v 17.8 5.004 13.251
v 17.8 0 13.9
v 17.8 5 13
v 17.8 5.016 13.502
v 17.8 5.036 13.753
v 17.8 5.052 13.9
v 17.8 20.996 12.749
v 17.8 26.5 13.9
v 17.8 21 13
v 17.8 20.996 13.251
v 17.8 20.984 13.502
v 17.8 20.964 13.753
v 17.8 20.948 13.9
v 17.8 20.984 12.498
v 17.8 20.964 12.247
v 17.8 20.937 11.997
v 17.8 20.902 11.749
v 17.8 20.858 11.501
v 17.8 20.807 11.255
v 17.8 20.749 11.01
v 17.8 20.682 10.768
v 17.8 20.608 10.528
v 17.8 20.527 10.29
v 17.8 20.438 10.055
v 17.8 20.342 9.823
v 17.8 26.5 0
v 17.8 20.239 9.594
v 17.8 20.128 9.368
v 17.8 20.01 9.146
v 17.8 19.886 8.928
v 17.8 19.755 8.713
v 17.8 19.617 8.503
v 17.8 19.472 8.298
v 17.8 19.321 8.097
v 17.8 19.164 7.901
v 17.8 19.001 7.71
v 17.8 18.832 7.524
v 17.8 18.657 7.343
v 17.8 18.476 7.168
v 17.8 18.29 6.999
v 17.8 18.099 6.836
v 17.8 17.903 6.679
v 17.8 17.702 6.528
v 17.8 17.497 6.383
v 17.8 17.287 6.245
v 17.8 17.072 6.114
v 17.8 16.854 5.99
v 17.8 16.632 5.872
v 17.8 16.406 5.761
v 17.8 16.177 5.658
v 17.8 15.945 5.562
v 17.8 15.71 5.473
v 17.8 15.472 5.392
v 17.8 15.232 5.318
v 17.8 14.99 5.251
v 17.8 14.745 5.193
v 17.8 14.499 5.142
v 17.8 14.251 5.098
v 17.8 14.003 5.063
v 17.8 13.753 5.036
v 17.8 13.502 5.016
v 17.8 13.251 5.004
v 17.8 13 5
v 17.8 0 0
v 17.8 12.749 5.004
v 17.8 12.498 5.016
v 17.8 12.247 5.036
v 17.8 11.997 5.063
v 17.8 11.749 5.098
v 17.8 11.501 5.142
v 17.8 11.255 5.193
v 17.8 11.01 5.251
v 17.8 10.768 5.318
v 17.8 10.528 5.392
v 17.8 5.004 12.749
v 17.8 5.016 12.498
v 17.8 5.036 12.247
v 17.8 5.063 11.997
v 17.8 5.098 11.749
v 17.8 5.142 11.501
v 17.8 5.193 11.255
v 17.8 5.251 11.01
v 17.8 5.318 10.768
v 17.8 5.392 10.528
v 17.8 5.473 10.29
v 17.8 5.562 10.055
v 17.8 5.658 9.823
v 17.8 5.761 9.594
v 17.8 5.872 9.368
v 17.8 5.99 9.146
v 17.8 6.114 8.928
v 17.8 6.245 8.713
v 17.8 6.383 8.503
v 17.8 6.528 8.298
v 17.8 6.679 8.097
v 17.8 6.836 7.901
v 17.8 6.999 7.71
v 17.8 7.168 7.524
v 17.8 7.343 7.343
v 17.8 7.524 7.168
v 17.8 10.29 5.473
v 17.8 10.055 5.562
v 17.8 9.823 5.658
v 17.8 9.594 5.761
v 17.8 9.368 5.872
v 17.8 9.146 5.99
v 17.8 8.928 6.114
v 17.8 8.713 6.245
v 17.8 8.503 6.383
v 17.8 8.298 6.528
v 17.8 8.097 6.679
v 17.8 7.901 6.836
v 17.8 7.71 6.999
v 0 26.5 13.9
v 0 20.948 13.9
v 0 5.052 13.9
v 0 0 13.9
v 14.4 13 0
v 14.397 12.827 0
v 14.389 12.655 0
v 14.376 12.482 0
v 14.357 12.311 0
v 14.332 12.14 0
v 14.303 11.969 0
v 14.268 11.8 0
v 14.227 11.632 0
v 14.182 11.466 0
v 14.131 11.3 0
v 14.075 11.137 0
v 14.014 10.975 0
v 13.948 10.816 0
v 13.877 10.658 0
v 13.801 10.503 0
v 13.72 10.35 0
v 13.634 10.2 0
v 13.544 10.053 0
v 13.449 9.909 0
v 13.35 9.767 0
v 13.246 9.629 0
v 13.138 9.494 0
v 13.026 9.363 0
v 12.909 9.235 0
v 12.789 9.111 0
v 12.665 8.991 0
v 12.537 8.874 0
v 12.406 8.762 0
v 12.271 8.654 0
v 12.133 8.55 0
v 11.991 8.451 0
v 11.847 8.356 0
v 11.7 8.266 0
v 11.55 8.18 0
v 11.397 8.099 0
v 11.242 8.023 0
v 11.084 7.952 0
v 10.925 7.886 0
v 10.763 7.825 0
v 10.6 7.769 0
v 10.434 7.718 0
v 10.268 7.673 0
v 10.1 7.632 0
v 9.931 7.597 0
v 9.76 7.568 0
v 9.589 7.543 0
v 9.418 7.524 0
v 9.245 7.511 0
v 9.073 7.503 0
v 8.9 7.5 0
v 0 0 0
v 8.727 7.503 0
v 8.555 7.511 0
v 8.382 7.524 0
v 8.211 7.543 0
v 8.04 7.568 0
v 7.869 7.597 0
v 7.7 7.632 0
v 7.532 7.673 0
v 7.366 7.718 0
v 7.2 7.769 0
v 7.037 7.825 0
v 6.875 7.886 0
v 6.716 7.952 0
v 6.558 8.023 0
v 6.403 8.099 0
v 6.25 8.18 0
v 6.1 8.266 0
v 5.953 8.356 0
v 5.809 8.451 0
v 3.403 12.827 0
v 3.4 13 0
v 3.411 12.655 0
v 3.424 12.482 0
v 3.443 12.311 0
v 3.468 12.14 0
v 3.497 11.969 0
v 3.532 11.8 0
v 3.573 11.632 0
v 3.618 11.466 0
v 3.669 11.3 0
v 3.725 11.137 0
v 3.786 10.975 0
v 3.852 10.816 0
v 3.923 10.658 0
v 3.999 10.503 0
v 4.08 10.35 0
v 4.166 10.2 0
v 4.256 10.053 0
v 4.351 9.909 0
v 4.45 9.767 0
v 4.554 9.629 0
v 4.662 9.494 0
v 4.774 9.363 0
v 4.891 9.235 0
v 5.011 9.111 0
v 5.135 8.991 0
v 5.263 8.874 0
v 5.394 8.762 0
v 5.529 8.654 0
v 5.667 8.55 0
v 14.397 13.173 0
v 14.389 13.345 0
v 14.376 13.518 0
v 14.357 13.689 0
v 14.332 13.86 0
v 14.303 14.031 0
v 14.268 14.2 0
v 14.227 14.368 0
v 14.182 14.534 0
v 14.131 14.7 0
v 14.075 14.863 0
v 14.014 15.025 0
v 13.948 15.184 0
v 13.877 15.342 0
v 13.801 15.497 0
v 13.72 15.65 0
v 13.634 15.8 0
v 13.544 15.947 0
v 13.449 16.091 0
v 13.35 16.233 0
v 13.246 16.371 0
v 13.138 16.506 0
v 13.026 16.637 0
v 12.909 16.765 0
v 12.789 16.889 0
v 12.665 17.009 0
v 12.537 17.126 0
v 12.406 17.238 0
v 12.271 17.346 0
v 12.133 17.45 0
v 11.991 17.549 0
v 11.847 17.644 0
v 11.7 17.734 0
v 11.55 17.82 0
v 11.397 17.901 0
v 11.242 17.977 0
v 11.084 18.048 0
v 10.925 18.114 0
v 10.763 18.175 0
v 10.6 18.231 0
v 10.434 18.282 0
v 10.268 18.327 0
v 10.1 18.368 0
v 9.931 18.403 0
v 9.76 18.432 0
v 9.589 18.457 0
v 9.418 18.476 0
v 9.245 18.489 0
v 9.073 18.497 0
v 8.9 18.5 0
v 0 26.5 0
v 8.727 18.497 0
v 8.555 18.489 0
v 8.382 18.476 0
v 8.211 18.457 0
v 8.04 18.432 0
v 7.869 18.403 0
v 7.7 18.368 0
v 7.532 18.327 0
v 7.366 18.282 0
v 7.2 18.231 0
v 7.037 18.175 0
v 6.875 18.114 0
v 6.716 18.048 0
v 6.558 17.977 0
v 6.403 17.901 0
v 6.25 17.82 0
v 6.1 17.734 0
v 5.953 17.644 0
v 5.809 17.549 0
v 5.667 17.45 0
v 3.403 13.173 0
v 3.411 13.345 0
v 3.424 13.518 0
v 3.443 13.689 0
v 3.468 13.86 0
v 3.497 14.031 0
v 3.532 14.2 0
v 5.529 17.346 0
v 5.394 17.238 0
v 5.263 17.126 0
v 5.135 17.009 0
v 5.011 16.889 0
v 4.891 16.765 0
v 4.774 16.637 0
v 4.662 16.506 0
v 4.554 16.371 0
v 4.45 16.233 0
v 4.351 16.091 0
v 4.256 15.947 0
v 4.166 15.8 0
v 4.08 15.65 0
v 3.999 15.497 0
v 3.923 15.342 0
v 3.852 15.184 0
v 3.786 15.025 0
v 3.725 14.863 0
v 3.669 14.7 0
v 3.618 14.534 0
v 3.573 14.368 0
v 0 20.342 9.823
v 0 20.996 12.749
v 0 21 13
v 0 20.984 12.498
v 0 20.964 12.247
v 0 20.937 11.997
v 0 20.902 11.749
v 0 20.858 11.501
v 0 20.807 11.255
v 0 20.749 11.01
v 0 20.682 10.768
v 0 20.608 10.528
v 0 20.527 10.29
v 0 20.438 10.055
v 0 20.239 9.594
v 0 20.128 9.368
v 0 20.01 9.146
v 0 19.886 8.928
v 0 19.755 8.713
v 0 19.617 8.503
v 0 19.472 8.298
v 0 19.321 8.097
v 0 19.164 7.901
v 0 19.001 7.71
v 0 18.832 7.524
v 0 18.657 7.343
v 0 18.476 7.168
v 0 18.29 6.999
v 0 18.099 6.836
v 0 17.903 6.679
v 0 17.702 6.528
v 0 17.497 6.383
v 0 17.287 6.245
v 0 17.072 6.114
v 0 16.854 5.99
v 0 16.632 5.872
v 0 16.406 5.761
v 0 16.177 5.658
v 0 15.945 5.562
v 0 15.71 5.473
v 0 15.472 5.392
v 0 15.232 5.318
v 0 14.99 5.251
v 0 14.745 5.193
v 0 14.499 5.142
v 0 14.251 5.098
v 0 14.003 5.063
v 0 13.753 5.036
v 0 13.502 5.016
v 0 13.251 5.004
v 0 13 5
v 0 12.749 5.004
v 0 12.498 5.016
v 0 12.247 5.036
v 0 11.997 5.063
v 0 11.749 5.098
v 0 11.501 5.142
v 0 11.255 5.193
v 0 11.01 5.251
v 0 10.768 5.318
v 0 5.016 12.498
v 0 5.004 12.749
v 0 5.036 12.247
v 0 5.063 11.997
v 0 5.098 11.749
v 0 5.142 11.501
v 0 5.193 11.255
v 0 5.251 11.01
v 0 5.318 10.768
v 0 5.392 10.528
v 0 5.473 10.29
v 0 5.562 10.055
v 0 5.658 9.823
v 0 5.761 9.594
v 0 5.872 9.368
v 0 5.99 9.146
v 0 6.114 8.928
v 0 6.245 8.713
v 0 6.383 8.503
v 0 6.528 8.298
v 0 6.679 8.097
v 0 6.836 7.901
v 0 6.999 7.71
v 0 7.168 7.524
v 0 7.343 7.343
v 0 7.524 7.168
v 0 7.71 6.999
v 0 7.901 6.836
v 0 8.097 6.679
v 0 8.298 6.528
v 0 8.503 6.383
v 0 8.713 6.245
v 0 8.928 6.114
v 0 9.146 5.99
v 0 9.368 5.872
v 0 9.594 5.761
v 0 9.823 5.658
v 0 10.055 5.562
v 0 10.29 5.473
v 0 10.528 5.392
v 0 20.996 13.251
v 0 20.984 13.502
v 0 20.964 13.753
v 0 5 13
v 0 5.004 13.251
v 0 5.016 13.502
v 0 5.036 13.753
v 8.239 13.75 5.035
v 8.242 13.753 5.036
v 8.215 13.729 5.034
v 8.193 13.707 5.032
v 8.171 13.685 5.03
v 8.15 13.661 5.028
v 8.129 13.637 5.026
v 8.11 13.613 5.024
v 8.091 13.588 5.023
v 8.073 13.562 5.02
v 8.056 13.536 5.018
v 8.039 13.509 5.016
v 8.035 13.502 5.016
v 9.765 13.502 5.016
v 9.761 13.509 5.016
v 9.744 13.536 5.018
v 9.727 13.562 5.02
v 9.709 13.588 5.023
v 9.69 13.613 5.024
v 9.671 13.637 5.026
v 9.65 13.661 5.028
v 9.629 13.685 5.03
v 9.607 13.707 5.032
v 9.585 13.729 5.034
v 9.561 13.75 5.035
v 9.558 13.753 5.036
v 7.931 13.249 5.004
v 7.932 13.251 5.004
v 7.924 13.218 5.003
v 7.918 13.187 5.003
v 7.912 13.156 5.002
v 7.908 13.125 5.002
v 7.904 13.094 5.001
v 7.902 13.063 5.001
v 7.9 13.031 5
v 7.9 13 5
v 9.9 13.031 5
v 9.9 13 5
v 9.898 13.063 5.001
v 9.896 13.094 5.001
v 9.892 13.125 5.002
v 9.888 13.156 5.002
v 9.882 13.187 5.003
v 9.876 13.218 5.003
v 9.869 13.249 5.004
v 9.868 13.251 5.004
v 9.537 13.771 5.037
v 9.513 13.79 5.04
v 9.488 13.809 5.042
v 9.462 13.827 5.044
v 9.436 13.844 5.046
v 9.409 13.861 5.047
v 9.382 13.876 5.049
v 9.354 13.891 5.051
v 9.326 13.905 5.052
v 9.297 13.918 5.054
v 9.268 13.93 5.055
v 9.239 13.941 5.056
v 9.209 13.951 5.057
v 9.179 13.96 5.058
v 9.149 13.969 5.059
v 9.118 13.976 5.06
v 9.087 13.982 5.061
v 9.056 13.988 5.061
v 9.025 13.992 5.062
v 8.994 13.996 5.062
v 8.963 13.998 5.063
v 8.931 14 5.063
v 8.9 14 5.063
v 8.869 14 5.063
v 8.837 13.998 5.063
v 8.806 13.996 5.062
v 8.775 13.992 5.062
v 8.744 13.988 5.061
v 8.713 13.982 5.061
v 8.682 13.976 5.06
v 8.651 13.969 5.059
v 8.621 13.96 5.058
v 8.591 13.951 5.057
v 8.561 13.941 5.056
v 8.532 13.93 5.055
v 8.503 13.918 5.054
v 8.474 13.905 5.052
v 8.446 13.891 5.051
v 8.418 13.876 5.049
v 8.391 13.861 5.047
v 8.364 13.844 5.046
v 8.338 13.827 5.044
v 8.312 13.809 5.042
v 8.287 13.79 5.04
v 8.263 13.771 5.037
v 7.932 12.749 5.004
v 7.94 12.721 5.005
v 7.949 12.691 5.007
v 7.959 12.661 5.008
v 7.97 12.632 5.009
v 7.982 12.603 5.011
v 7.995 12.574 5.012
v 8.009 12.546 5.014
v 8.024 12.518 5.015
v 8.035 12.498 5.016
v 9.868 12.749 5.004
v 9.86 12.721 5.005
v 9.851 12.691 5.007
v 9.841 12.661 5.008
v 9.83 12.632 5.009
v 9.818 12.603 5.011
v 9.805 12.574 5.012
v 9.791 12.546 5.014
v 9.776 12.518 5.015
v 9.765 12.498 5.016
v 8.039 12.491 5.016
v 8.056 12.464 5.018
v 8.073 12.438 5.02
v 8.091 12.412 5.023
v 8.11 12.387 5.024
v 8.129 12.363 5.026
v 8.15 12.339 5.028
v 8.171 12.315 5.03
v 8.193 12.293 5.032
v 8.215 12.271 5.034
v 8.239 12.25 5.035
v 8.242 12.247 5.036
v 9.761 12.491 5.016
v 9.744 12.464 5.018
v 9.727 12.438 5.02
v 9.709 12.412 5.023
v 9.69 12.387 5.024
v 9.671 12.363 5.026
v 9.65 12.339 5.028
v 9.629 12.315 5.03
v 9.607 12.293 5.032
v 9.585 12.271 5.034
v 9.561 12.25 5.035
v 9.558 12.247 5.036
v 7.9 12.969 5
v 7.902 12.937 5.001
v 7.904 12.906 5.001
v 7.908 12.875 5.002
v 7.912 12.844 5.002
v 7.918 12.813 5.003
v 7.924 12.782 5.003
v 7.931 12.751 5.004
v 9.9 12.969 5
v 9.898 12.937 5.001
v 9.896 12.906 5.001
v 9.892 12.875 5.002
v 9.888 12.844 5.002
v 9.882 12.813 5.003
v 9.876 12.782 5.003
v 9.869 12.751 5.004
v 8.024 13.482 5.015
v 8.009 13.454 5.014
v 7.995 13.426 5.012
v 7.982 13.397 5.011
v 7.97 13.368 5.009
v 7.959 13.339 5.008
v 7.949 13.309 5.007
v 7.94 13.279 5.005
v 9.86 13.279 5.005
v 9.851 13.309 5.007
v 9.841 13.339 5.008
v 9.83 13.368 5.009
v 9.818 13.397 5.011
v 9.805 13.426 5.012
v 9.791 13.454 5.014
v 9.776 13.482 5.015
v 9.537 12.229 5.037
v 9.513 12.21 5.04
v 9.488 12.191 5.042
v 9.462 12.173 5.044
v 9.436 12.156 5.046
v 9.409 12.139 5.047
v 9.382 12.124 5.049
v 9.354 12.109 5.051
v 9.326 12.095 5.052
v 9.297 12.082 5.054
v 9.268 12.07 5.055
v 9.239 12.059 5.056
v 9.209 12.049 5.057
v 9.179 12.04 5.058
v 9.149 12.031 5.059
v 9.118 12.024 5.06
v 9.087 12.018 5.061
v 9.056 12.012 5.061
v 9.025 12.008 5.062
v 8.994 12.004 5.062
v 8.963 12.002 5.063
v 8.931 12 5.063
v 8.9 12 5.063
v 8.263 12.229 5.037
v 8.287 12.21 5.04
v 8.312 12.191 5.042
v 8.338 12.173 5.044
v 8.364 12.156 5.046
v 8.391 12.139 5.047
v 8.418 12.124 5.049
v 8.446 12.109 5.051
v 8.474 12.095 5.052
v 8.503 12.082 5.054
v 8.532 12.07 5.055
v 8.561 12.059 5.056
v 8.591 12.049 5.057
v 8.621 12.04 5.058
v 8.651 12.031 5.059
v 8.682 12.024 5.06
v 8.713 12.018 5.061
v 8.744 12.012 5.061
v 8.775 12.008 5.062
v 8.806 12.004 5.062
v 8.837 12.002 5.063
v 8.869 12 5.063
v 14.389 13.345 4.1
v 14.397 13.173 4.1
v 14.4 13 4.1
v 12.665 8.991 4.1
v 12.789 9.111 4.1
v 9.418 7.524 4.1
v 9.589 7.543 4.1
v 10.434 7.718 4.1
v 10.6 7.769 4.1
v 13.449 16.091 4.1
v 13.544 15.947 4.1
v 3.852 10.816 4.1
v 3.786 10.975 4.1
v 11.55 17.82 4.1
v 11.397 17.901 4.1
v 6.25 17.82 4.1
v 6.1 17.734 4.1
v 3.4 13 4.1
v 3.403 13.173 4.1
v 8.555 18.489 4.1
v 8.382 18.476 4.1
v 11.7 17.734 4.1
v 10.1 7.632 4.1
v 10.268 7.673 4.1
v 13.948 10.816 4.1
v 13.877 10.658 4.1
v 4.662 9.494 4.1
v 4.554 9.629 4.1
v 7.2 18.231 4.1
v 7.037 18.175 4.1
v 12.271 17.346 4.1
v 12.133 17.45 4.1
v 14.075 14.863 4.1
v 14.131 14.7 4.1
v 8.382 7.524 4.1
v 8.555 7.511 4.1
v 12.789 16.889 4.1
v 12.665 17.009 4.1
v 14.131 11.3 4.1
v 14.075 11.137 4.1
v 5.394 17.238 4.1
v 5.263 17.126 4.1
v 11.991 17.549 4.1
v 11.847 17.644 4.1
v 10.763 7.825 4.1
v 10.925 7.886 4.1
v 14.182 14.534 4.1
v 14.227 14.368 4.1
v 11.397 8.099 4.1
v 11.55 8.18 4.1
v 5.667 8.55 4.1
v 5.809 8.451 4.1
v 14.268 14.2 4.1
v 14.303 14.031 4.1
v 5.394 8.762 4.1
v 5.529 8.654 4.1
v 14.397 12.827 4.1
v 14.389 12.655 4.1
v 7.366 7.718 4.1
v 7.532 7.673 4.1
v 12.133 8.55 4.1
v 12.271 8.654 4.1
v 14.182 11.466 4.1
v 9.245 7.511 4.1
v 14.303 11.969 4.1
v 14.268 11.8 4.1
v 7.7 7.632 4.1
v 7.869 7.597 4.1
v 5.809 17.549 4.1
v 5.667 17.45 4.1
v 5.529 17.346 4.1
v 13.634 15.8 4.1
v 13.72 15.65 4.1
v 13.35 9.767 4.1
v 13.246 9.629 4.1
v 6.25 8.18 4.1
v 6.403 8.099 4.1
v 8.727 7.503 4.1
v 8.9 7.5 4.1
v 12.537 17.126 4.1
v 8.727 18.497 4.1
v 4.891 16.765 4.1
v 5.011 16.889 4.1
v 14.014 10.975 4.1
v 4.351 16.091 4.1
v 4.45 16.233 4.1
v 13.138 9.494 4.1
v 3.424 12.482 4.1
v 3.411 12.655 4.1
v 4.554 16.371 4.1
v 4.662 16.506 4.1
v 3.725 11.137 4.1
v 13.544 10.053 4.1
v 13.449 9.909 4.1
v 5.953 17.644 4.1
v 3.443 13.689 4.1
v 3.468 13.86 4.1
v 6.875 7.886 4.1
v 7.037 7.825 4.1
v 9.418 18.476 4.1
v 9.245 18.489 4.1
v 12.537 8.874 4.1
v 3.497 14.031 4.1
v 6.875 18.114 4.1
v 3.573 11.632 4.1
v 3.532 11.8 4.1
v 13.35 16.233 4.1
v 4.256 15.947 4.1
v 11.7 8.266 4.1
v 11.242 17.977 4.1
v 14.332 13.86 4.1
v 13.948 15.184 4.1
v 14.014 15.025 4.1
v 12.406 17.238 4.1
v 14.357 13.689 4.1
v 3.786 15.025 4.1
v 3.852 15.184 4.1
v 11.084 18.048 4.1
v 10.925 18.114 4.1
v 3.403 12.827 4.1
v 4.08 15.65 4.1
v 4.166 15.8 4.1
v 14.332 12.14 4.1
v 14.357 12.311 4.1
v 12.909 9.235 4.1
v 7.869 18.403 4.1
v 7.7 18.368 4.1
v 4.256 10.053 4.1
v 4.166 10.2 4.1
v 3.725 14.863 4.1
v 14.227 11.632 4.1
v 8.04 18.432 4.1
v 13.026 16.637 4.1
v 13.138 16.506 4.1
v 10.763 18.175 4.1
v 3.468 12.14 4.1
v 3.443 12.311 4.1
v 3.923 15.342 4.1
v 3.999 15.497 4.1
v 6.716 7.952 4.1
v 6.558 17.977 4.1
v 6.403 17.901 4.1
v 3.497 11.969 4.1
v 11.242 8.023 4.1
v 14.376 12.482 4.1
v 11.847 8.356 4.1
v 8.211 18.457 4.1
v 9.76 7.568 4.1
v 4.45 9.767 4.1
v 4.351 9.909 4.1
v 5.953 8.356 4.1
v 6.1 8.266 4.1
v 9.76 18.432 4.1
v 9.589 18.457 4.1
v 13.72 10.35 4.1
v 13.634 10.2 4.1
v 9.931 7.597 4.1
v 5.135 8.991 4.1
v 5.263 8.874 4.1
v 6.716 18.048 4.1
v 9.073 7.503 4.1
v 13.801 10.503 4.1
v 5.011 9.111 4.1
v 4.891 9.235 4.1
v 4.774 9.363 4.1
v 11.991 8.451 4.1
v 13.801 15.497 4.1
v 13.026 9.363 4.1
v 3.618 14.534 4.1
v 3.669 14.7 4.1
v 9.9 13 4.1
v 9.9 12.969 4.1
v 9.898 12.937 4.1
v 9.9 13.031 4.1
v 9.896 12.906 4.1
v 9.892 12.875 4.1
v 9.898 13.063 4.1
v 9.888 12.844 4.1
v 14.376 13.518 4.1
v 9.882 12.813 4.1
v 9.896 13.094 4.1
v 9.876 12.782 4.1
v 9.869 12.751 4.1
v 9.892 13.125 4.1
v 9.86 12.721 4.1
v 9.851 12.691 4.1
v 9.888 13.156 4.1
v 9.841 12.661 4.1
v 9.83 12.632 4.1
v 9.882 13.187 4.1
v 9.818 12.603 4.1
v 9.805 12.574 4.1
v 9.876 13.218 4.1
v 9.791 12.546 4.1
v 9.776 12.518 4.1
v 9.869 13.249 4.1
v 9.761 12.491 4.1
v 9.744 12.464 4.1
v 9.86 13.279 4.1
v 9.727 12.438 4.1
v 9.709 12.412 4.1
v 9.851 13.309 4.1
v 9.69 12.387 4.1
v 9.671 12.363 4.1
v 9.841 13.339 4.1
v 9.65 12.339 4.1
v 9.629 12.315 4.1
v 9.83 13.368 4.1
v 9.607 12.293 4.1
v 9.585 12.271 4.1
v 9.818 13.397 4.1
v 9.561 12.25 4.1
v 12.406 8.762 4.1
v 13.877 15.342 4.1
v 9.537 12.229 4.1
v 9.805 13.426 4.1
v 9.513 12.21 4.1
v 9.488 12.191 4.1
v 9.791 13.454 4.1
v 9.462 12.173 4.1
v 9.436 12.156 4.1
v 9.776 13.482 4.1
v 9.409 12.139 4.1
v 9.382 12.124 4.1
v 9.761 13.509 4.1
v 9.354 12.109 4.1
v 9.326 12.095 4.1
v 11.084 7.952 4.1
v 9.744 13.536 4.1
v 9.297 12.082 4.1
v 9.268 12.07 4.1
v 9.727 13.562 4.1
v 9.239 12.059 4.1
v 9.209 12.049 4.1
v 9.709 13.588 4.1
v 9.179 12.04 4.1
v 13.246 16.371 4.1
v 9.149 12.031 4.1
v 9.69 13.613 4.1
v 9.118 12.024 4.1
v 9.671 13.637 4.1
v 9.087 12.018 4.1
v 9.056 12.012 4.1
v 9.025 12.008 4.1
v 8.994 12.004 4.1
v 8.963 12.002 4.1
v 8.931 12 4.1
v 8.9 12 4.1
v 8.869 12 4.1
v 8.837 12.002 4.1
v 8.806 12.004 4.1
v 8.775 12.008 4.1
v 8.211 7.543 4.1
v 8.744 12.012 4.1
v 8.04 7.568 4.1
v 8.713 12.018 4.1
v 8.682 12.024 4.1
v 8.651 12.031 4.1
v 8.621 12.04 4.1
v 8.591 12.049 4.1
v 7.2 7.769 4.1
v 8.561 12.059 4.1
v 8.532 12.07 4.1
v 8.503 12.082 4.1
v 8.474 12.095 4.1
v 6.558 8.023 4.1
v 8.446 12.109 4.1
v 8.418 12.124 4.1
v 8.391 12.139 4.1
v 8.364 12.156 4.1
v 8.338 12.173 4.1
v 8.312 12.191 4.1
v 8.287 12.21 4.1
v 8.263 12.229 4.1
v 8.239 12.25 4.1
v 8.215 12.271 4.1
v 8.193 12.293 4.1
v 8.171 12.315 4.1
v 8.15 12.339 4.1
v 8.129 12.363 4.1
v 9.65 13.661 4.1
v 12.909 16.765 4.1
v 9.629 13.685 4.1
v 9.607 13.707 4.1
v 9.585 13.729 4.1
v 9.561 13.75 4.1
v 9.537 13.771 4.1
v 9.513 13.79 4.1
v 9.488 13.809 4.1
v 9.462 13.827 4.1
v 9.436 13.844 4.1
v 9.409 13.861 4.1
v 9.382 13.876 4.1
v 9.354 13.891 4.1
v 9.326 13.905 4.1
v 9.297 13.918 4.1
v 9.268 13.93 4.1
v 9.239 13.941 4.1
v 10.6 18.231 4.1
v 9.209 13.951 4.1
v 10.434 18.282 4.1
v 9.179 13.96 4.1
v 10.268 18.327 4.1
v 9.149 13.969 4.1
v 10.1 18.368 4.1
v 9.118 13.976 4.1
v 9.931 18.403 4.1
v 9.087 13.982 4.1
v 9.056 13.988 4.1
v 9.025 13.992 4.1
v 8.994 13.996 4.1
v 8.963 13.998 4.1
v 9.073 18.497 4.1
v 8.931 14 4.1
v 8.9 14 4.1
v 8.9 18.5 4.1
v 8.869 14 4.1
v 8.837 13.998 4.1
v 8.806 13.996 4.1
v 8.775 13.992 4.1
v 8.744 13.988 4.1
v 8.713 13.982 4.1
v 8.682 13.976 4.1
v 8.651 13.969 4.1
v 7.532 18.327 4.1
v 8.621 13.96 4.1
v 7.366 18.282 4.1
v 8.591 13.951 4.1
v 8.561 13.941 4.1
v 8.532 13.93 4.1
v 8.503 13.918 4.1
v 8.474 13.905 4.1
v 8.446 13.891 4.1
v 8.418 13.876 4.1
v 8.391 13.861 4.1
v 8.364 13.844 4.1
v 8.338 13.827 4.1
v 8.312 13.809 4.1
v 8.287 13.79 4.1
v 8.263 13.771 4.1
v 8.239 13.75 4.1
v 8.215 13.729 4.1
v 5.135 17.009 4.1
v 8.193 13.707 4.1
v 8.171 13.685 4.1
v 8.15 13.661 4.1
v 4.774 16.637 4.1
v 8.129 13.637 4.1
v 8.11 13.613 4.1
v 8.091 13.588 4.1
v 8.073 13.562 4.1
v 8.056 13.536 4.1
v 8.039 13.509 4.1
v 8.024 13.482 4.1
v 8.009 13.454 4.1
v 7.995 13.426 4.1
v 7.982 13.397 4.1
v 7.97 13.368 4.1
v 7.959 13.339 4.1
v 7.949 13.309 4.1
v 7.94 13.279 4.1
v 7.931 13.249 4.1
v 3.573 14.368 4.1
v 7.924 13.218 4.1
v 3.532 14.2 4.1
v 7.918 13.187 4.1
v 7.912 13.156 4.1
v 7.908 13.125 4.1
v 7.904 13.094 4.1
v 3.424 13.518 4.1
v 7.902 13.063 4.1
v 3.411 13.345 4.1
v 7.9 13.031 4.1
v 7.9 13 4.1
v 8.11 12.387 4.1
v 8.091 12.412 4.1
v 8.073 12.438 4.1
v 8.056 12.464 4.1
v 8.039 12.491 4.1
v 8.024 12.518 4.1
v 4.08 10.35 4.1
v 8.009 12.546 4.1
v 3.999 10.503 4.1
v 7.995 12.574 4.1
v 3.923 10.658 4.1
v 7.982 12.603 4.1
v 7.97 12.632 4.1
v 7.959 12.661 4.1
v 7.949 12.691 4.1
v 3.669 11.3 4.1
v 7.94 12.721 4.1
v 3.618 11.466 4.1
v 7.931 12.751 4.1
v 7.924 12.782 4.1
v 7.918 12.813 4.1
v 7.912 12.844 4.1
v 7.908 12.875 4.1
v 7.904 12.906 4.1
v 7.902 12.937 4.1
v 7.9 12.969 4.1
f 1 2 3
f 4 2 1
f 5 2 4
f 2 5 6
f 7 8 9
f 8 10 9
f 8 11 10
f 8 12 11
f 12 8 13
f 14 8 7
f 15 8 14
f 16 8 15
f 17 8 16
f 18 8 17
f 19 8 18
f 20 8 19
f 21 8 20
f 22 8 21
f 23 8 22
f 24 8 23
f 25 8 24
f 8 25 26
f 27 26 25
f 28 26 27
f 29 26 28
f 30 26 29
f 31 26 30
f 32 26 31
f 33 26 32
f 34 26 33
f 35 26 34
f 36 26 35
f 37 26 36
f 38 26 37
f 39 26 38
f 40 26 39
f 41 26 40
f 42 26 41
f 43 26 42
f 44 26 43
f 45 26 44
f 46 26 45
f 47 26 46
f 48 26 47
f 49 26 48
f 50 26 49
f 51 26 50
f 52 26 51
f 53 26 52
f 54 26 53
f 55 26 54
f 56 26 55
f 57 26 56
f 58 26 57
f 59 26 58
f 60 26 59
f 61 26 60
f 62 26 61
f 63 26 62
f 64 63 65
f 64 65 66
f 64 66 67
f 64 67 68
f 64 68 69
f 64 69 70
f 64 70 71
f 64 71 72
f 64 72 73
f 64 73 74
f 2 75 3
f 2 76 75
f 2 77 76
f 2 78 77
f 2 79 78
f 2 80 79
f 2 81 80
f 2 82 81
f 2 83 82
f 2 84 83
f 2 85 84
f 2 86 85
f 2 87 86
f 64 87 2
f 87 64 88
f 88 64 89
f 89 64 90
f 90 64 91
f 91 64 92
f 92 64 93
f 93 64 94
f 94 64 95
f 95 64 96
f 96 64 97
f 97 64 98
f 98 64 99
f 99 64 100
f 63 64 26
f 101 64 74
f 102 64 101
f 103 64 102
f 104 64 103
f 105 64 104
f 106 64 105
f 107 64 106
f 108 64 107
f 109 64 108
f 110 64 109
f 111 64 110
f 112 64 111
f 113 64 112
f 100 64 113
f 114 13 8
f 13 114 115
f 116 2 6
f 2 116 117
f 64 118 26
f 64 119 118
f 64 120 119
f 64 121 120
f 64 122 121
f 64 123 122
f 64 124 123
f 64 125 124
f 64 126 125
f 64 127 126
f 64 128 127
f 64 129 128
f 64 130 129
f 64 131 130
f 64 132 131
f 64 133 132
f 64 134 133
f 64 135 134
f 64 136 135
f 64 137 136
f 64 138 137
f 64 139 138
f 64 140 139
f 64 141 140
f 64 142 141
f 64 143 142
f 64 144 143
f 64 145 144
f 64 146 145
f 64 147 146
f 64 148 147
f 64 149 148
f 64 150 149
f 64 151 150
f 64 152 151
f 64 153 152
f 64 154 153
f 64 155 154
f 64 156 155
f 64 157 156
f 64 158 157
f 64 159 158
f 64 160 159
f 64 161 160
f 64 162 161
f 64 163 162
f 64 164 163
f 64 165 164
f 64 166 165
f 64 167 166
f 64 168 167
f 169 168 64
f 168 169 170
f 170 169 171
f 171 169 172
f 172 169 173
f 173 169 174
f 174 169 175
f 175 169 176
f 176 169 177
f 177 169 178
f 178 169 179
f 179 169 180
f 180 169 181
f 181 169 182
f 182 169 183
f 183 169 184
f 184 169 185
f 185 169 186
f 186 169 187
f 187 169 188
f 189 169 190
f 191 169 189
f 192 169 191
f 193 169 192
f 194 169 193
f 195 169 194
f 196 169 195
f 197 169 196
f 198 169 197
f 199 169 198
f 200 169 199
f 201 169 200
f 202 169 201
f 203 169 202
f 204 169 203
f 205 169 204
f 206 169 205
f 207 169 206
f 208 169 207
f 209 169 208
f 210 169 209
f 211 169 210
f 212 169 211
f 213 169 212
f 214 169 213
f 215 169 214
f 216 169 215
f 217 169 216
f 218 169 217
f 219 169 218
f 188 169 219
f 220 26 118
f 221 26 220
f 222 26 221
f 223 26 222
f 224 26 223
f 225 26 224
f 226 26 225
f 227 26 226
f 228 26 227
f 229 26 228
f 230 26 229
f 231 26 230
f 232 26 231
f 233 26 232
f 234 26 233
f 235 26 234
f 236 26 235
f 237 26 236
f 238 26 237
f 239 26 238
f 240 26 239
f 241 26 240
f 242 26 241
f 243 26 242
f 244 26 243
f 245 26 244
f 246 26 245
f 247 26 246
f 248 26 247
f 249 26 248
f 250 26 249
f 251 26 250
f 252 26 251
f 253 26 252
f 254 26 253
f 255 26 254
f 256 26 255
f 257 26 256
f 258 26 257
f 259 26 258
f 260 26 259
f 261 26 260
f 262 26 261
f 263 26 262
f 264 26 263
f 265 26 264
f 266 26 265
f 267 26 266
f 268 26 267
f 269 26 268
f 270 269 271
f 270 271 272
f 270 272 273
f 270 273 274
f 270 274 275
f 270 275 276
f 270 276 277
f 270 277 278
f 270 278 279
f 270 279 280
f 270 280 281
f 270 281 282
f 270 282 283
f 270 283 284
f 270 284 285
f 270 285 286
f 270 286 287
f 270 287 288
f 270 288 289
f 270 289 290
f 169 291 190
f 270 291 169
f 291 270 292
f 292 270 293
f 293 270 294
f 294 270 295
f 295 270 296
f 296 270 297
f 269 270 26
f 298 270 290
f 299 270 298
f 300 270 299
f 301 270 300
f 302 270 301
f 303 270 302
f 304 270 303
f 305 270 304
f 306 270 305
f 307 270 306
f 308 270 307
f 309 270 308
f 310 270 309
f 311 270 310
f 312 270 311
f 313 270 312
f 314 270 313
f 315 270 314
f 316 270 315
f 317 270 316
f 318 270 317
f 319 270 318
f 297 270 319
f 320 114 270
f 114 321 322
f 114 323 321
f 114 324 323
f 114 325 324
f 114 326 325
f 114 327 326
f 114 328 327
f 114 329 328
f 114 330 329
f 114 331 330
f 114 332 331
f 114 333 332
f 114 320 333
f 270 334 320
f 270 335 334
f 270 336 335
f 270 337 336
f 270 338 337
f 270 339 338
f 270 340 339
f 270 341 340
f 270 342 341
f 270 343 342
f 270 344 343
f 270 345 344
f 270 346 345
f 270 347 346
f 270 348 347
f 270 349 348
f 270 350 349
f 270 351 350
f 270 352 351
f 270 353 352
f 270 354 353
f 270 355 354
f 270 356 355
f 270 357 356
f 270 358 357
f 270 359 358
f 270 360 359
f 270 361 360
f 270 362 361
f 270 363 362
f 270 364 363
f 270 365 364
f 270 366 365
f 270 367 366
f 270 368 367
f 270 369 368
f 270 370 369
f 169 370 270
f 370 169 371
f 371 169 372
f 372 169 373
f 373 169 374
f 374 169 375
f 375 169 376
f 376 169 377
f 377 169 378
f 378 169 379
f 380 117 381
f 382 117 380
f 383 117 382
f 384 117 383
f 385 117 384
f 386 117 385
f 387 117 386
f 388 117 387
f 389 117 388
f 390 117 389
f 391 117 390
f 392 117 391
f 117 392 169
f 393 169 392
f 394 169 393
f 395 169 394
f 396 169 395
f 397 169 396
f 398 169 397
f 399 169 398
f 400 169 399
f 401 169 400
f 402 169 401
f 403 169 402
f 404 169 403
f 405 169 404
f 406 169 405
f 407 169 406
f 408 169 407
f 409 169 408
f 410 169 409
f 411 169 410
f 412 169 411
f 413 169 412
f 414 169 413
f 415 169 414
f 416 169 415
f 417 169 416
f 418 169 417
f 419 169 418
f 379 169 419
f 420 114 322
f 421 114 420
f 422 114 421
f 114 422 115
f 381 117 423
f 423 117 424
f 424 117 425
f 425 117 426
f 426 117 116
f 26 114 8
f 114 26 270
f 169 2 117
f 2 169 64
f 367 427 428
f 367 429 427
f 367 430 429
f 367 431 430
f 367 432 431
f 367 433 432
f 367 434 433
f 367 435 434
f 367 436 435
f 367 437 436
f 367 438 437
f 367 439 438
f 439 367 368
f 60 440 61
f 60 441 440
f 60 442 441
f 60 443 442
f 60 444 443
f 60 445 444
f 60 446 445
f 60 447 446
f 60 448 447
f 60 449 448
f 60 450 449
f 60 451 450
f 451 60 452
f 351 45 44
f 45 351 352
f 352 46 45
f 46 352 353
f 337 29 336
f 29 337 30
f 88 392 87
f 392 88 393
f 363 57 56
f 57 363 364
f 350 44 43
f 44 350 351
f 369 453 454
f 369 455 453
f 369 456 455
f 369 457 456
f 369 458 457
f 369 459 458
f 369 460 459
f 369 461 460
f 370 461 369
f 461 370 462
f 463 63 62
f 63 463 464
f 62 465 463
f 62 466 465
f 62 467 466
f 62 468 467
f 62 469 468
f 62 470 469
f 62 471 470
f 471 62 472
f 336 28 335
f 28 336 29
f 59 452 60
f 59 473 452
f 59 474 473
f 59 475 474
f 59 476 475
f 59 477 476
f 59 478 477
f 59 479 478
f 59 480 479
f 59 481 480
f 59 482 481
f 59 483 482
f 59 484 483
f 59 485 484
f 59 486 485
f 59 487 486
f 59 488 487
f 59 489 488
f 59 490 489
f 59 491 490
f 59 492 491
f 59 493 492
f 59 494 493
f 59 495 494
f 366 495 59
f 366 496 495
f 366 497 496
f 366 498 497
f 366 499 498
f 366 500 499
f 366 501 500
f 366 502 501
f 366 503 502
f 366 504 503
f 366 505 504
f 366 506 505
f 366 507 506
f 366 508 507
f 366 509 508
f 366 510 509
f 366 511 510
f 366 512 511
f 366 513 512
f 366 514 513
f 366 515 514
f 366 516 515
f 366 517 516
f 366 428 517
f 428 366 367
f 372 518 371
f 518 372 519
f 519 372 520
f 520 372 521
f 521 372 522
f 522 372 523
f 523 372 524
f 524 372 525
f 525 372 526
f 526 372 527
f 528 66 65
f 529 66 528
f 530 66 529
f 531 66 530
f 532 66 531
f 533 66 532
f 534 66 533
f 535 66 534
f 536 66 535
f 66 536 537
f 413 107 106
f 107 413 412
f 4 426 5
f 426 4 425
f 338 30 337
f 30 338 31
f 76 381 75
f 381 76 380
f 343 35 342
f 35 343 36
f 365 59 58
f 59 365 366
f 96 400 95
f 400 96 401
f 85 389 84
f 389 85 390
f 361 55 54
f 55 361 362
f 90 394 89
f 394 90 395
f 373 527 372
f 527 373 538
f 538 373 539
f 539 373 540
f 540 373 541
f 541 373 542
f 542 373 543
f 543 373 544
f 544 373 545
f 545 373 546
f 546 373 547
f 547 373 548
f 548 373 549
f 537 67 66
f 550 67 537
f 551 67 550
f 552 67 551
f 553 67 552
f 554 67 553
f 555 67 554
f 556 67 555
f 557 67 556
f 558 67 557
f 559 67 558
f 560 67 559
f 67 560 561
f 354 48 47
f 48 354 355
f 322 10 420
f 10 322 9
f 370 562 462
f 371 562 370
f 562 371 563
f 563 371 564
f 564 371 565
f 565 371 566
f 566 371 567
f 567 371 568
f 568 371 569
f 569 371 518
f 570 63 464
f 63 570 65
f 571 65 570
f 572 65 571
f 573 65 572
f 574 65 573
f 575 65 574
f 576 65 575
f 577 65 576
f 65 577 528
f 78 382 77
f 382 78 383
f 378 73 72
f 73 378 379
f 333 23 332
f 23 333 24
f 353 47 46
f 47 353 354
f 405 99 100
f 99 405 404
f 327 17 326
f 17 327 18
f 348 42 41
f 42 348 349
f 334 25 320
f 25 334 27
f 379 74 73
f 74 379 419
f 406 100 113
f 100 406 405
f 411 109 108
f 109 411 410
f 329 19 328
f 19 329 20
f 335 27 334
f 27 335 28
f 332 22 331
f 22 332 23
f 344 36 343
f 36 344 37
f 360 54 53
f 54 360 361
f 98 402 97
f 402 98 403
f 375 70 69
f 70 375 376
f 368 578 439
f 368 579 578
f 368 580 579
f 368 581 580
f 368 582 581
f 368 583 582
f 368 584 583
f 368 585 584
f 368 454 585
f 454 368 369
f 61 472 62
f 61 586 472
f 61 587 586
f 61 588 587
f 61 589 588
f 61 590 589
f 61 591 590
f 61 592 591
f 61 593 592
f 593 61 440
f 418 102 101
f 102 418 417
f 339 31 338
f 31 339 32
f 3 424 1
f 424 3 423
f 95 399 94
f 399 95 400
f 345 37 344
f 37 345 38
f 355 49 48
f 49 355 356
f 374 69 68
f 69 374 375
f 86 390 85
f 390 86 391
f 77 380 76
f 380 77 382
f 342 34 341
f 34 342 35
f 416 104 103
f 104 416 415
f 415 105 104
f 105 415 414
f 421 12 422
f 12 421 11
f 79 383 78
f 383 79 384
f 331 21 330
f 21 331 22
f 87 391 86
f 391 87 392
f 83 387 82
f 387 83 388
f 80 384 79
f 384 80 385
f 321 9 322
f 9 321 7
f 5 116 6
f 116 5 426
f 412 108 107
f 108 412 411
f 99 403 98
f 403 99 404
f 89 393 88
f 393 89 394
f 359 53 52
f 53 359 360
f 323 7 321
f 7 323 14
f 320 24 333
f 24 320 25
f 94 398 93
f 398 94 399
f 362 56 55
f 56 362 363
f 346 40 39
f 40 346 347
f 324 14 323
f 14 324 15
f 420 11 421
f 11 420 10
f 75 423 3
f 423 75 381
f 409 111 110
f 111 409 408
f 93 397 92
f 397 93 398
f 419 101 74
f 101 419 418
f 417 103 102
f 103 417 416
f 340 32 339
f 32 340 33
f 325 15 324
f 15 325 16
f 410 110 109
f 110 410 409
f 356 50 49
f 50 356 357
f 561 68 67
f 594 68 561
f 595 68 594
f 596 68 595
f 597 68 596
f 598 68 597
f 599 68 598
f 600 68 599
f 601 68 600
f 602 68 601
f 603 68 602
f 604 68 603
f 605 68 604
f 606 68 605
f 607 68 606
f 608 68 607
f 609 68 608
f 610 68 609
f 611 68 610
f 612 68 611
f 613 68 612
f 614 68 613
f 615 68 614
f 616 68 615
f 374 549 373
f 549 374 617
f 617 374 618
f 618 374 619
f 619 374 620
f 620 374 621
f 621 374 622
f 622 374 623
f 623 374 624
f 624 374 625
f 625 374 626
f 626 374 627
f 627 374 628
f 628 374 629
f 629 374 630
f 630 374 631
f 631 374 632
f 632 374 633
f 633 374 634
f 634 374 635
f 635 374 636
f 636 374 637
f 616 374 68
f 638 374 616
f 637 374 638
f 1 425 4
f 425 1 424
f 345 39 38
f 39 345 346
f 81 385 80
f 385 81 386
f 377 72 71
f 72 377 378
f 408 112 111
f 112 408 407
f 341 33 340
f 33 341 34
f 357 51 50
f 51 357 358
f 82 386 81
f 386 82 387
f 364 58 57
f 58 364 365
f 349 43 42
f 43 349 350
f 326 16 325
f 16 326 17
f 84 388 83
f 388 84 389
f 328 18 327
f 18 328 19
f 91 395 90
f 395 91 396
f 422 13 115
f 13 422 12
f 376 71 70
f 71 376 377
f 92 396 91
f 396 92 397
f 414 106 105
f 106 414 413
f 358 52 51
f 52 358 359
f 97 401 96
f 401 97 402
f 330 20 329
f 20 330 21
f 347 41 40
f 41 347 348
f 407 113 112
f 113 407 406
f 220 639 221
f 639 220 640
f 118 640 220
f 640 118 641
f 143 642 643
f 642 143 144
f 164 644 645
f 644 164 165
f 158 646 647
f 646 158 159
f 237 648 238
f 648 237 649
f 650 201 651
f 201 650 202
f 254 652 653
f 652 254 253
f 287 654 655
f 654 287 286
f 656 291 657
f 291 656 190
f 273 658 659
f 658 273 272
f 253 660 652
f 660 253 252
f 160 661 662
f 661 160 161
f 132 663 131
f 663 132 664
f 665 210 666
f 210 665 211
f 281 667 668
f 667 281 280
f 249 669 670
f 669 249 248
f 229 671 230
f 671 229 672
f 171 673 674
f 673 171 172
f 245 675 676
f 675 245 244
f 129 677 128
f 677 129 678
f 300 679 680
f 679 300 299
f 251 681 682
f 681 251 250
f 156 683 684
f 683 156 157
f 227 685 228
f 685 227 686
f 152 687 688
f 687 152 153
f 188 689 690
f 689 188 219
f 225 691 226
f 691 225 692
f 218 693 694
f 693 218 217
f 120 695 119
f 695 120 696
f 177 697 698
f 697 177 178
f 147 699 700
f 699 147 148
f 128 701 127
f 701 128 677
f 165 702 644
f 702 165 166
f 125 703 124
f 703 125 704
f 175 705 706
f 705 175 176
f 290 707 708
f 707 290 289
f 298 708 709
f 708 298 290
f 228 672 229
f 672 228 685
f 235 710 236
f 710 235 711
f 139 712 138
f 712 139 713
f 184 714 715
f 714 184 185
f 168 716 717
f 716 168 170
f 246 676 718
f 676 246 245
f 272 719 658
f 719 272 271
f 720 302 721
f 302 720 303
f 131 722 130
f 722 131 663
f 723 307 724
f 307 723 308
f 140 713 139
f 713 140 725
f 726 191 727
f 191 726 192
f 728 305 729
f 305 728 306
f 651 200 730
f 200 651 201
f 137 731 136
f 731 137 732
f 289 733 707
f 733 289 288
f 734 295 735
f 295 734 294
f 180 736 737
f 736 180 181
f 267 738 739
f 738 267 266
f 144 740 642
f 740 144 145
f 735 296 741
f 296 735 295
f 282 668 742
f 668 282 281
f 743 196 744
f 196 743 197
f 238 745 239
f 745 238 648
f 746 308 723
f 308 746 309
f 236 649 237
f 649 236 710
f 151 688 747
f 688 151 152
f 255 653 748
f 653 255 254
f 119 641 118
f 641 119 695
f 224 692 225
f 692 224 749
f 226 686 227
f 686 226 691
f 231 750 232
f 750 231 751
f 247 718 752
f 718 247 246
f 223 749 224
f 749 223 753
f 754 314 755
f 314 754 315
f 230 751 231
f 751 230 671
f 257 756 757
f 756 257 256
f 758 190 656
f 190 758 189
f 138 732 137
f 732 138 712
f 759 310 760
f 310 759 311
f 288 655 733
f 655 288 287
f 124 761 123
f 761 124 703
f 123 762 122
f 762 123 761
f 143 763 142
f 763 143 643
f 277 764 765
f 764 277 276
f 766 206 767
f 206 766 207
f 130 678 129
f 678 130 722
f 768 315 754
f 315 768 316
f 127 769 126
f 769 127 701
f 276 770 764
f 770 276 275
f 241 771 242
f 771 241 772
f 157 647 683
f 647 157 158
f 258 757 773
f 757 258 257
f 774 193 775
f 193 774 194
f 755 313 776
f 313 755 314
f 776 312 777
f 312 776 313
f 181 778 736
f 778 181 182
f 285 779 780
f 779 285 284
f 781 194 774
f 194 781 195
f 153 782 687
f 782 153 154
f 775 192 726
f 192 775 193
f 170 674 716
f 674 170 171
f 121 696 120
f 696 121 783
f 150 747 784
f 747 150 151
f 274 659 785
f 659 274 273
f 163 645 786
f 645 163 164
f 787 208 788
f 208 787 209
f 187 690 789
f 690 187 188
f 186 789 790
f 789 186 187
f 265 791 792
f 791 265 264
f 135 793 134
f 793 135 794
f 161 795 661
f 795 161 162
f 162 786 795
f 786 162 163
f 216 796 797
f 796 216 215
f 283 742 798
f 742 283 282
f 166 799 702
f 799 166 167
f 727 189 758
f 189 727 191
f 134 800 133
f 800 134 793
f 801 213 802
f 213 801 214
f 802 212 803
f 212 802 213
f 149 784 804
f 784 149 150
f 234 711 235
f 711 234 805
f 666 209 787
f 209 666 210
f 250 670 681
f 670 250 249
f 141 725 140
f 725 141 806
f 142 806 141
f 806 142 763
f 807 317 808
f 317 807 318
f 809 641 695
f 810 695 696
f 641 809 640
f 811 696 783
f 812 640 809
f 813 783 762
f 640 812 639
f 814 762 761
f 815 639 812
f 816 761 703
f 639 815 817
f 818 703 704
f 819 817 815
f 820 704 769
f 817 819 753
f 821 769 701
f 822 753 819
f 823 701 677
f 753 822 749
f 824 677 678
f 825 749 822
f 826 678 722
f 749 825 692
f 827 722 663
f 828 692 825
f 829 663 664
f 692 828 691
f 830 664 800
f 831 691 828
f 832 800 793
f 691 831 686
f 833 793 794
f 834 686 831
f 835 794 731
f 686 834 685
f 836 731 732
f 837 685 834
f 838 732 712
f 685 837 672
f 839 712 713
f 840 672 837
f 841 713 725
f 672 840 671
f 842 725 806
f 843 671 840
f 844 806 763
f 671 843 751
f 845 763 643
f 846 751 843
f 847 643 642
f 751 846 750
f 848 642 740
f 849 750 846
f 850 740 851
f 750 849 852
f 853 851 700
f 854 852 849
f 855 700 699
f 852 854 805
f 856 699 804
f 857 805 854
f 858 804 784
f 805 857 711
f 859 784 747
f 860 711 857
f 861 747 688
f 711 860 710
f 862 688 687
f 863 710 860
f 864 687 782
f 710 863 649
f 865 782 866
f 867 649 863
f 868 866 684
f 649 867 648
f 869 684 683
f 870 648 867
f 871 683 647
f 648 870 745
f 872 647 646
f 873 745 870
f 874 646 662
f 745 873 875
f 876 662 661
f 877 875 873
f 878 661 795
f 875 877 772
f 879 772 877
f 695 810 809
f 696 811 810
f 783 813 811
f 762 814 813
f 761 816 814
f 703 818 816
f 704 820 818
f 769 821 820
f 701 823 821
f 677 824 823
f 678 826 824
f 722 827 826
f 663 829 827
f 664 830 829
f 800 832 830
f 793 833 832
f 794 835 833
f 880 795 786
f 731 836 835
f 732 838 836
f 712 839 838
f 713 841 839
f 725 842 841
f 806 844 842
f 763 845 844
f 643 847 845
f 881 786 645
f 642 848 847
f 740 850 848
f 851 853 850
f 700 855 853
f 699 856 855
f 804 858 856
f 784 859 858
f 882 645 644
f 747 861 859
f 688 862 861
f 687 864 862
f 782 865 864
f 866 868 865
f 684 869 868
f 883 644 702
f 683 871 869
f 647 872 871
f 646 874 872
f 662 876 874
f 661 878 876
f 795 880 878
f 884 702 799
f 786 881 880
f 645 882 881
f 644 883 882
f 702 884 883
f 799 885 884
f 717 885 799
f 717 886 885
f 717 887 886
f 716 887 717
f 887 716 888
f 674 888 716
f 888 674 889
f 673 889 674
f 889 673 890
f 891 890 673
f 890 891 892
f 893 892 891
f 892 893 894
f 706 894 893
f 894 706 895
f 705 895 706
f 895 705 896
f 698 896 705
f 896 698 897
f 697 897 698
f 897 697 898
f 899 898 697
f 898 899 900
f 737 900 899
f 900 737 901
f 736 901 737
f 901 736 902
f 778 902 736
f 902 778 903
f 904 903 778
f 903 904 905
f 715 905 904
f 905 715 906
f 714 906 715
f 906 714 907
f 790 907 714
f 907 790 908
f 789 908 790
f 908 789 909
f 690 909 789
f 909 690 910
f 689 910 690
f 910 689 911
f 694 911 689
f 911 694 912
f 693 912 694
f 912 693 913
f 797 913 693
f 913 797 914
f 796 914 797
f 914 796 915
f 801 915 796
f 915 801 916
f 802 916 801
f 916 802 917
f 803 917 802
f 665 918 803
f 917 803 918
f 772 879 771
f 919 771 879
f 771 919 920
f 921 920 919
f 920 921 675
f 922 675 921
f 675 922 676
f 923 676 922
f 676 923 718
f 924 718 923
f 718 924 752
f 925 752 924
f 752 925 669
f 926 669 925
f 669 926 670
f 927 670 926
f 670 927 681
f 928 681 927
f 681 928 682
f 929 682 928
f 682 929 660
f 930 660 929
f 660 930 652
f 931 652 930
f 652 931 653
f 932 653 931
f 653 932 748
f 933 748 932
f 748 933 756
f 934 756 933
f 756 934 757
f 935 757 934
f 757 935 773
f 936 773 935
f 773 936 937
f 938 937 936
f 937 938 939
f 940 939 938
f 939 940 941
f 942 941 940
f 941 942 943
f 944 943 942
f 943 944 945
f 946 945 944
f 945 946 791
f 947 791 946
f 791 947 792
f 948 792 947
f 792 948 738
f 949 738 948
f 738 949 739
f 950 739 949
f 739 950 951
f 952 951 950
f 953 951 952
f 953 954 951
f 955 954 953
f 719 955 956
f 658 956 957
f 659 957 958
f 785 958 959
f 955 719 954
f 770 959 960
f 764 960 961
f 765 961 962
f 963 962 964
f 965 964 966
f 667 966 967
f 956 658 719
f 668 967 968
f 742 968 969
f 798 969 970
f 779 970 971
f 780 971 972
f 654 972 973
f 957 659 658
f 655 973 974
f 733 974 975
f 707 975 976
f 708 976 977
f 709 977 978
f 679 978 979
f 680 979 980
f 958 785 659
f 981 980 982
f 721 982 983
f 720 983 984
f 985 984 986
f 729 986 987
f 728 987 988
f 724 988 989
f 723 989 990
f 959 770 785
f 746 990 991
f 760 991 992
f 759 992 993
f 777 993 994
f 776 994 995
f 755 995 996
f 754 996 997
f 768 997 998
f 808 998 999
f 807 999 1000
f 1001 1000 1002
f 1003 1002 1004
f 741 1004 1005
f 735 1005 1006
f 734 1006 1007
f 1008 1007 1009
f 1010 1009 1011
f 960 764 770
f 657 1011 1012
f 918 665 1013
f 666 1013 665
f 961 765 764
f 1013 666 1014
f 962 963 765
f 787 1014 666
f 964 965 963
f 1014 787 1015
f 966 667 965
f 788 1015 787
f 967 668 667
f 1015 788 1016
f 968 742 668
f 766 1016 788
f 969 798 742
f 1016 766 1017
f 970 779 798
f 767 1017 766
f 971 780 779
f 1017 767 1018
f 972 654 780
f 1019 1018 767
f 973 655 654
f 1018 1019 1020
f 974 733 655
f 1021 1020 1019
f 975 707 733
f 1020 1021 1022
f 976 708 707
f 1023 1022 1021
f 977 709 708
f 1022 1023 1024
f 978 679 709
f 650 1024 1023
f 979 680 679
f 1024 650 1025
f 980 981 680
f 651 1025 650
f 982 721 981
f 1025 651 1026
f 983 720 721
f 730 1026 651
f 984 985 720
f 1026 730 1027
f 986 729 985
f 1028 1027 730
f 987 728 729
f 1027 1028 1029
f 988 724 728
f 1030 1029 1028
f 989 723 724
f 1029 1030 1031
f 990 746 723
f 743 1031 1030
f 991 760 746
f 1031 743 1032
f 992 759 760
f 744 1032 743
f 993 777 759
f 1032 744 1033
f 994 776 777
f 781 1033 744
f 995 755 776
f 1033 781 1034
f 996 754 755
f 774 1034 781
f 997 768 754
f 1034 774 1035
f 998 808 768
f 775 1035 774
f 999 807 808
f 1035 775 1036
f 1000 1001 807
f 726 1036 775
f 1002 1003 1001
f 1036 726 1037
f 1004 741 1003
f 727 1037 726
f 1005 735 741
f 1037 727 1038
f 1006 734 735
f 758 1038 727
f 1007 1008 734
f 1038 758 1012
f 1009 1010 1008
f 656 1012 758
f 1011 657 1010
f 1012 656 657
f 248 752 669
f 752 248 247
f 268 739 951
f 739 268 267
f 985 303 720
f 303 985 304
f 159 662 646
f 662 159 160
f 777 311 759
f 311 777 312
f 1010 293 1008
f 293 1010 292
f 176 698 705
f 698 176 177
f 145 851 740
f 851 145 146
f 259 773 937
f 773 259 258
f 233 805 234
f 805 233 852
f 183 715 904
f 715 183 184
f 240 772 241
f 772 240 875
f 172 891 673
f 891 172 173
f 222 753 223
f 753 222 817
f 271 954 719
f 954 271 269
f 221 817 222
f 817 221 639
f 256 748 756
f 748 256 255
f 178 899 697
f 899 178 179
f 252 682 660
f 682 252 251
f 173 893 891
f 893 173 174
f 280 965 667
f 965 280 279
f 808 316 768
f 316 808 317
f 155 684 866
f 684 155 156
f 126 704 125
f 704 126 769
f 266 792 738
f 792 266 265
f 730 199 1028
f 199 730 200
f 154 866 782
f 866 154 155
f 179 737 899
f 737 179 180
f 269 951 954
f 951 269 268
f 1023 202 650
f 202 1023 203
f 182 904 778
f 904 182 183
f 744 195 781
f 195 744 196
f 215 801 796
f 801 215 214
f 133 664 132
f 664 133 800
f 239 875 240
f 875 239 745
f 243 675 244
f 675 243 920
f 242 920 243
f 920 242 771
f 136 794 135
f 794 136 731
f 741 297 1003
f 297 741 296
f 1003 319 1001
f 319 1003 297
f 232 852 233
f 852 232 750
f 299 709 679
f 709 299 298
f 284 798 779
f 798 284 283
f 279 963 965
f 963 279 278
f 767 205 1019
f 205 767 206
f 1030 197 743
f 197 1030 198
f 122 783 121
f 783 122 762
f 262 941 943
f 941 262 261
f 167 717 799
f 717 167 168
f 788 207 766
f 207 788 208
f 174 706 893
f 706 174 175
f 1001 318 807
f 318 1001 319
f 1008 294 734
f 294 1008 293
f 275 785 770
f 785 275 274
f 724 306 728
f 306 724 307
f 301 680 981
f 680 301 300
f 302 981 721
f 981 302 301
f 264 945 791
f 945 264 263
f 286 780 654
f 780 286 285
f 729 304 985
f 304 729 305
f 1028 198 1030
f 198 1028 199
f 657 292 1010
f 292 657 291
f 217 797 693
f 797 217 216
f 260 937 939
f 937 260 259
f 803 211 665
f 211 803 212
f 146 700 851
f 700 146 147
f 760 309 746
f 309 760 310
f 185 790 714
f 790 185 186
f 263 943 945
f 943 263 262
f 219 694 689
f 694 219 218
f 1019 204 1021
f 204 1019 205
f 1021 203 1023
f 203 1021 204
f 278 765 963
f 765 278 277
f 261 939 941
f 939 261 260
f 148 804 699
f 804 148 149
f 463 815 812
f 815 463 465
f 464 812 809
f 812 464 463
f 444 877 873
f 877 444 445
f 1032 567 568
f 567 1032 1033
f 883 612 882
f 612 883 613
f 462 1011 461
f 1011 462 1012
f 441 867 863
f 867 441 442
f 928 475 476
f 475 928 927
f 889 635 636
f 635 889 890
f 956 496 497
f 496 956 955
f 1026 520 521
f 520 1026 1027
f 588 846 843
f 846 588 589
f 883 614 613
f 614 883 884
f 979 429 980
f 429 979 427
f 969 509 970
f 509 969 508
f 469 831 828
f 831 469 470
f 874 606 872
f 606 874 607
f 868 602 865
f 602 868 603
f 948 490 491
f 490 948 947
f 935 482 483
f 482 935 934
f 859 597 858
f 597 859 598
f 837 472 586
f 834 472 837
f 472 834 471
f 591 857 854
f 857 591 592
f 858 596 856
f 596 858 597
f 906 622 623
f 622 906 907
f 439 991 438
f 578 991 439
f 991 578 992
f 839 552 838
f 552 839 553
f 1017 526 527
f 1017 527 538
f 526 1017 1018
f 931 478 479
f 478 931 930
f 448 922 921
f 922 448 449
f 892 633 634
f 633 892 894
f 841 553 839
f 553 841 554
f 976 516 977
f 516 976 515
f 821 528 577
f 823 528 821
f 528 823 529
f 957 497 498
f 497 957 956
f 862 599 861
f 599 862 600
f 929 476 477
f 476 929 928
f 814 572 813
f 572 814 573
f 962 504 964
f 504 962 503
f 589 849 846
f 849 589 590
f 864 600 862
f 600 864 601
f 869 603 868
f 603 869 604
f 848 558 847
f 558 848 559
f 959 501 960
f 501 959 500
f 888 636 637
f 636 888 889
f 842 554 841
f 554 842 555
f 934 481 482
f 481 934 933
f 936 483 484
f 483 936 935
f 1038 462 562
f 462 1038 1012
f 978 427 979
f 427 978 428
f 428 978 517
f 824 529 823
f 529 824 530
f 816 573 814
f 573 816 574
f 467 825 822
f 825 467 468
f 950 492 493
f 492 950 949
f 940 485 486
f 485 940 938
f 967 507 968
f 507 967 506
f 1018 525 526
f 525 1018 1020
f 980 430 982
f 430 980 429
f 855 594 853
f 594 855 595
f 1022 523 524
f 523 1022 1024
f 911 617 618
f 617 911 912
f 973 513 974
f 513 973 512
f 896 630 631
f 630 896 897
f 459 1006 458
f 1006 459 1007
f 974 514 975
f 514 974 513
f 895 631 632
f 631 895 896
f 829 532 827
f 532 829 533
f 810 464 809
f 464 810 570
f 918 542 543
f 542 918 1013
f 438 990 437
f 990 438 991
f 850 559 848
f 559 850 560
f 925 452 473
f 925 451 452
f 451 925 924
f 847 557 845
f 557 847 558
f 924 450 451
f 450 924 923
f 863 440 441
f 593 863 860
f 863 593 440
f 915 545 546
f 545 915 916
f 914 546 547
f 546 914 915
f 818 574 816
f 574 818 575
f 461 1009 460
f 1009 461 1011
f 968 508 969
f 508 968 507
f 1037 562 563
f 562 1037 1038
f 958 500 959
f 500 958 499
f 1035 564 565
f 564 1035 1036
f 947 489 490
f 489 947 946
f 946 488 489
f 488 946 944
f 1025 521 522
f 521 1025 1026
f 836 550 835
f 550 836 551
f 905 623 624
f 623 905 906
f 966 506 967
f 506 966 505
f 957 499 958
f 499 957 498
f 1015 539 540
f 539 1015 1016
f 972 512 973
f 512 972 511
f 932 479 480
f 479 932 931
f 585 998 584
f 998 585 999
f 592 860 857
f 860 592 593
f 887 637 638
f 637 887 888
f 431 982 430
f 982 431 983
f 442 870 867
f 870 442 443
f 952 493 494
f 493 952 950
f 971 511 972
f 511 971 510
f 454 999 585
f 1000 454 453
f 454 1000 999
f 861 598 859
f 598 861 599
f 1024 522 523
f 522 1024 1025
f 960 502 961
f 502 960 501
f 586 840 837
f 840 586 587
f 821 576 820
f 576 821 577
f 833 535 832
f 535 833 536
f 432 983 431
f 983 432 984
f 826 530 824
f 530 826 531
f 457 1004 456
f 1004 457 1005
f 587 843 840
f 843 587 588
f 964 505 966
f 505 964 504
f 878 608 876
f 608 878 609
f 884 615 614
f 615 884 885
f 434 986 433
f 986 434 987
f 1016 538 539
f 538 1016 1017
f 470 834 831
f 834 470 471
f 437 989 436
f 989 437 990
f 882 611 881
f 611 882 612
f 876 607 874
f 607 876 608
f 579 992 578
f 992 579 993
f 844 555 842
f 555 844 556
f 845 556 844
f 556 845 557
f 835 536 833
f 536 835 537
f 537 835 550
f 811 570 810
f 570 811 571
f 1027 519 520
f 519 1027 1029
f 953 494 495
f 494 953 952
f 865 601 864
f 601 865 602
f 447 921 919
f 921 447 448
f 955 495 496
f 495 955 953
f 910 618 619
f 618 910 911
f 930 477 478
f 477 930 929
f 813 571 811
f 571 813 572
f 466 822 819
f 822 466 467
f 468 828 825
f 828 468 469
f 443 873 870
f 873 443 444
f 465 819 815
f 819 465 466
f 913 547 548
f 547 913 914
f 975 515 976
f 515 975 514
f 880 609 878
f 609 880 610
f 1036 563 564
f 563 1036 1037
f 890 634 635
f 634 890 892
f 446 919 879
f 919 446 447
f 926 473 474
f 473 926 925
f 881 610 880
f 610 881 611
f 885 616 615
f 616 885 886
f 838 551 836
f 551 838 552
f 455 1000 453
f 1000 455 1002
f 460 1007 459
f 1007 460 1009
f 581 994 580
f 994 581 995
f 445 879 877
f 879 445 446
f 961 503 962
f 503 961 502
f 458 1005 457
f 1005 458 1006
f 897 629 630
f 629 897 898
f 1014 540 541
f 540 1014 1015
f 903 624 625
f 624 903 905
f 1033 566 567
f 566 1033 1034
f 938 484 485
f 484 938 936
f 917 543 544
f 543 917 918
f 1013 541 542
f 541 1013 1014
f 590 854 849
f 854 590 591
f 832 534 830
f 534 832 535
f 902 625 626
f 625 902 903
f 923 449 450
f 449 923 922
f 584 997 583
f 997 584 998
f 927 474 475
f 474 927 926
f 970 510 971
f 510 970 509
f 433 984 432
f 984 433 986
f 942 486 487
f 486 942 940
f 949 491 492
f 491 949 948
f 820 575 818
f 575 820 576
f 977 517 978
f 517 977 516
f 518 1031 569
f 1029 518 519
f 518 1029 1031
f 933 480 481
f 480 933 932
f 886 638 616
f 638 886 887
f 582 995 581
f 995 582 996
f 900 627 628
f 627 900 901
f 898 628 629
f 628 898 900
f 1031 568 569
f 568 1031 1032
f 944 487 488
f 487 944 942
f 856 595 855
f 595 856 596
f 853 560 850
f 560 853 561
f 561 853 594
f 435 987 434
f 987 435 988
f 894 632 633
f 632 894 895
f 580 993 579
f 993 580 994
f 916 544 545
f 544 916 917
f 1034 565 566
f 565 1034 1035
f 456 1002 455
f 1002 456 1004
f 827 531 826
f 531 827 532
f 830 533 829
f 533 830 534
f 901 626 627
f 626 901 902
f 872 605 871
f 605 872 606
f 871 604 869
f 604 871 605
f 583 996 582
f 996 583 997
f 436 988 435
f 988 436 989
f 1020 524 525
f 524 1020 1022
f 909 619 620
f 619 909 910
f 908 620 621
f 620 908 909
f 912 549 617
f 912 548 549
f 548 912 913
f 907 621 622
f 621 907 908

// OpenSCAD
$fn = 200;

foot_x = 17.8;
foot_y = 26.5;
foot_z = 13.9;
pipe_d = 16;
screwhead_plus_washer_h = 3.7;

module foot() {
    difference () {
        //Overall shape + hollowed out for metal pipe
        difference () {
            cube([foot_x, foot_y, foot_z]);
            translate([-5, 13, 13])
            rotate ([0, 90, 0])
            cylinder(h = foot_x * 2, d = pipe_d);
        }

        //Screwhole
        union() {
            translate([foot_x/2, 13, -0.1])
            cylinder(h = screwhead_plus_washer_h + 0.5, d = 11);
            translate([foot_x/2, 13, 4-0.2])
            cylinder(h = 10, d = 2);
        }
    }
}

foot();
